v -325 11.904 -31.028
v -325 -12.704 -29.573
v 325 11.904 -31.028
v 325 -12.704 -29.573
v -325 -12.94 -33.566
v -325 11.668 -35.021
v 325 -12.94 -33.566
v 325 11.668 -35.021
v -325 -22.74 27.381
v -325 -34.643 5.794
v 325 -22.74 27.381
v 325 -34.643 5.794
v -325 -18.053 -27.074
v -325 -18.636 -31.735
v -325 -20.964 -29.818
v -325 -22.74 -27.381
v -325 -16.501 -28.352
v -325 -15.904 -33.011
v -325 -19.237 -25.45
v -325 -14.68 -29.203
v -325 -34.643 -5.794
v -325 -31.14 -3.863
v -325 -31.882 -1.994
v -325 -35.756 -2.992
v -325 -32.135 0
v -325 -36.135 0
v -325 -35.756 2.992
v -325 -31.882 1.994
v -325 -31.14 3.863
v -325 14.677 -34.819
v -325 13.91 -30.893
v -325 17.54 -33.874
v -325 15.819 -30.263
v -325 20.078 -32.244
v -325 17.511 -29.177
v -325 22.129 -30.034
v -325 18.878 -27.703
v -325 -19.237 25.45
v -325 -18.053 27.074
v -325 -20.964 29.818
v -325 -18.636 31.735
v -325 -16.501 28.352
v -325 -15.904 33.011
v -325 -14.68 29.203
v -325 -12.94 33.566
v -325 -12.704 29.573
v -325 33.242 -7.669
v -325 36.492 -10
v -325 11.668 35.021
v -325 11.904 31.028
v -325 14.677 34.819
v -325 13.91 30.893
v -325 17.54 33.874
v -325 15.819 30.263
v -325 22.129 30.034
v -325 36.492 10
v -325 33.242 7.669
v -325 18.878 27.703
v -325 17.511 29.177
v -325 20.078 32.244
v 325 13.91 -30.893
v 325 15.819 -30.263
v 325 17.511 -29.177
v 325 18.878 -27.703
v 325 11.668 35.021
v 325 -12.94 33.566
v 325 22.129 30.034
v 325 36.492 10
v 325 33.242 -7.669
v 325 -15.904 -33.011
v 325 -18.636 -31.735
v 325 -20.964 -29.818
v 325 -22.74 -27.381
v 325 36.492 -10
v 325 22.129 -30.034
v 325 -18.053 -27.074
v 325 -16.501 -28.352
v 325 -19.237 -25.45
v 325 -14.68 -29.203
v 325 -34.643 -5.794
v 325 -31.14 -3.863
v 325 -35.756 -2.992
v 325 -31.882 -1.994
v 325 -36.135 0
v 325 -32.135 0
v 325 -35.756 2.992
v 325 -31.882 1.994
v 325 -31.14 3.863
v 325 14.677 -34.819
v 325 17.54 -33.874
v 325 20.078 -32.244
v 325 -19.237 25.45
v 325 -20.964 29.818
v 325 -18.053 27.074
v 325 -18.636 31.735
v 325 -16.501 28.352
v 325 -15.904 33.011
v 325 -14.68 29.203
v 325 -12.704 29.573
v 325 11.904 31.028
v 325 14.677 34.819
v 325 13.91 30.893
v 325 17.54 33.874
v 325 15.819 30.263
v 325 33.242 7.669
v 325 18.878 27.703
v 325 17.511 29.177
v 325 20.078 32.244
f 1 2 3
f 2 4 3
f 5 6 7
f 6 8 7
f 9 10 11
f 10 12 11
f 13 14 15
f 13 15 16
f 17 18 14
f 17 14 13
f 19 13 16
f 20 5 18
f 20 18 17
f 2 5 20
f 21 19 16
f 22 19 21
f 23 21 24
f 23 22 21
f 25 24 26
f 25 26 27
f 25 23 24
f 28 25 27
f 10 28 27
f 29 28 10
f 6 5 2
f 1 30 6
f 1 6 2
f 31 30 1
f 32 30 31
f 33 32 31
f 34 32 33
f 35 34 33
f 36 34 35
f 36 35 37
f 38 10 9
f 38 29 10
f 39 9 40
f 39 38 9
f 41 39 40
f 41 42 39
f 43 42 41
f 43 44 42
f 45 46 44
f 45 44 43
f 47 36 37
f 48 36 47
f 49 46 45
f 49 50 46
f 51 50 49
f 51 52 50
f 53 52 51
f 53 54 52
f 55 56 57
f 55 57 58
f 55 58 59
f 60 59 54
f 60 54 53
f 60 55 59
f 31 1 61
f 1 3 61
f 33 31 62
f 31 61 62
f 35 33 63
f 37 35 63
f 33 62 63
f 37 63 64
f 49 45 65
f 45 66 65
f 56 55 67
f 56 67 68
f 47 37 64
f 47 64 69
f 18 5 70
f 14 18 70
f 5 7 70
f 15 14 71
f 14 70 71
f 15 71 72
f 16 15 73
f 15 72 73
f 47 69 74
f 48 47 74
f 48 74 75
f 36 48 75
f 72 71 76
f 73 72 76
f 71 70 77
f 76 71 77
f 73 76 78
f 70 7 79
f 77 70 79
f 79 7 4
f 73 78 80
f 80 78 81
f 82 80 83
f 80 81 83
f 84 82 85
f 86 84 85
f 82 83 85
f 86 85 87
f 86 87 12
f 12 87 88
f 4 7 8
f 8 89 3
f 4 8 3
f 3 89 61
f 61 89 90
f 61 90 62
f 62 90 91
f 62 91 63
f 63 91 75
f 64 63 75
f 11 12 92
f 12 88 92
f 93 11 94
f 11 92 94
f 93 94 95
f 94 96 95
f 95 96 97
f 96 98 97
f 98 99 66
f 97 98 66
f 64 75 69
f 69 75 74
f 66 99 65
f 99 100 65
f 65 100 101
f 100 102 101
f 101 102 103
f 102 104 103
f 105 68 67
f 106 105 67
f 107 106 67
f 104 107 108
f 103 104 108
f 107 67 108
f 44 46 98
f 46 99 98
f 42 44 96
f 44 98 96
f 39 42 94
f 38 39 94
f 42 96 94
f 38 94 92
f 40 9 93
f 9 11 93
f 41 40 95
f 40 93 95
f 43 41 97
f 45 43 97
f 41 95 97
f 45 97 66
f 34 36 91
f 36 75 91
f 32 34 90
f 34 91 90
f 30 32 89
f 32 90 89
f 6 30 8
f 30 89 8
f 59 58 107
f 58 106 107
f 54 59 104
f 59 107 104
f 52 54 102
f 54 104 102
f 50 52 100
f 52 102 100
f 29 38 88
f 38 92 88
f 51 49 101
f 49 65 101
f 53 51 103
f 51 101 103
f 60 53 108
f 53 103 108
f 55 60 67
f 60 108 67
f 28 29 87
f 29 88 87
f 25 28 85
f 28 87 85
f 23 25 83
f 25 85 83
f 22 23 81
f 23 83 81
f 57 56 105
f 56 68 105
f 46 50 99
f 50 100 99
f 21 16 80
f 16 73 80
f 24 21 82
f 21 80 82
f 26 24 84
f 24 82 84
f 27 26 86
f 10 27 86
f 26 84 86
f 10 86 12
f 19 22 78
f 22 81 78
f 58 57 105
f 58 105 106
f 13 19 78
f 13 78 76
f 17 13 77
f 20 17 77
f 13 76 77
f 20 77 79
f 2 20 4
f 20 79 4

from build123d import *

# Parameters (mm, degrees)
EXTRUDE_THIN1_DEPTH = 325


with BuildPart() as part:
    # Sketch1 → Extrude-Thin1 (new, symmetric)
    with BuildSketch(Plane(origin=(0, 0, 0), x_dir=(0, 0, -1), z_dir=(1, 0, 0))):
        with BuildLine():
            Line((10, 36.492499074), (30.033921668, 22.128857106))
            ThreePointArc((30.033921668, 22.128857106), (33.873815741, 17.540413964), (35.020847295, 11.668198405))
            Line((35.020847295, 11.668198405), (33.565953275, -12.939839131))
            ThreePointArc((33.565953275, -12.939839131), (31.734968696, -18.635986288), (27.381153255, -22.739995068))
            Line((27.381153255, -22.739995068), (5.79428183, -34.642902698))
            ThreePointArc((5.79428183, -34.642902698), (0, -36.134510905), (-5.79428183, -34.642902698))
            Line((-5.79428183, -34.642902698), (-27.381153255, -22.739995068))
            ThreePointArc((-27.381153255, -22.739995068), (-31.734968696, -18.635986288), (-33.565953275, -12.939839131))
            Line((-33.565953275, -12.939839131), (-35.020847295, 11.668198405))
            ThreePointArc((-35.020847295, 11.668198405), (-33.873815741, 17.540413964), (-30.033921668, 22.128857106))
            Line((-30.033921668, 22.128857106), (-10, 36.492499074))
            Line((-10, 36.492499074), (-7.669281259, 33.241691459))
            Line((-7.669281259, 33.241691459), (-27.703202927, 18.878049491))
            ThreePointArc((-27.703202927, 18.878049491), (-30.263132309, 15.819087397), (-31.027820011, 11.904277024))
            Line((-31.027820011, 11.904277024), (-29.572925992, -12.703760512))
            ThreePointArc((-29.572925992, -12.703760512), (-28.352269606, -16.50119195), (-25.449725978, -19.237197803))
            Line((-25.449725978, -19.237197803), (-3.862854553, -31.140105433))
            ThreePointArc((-3.862854553, -31.140105433), (0, -32.134510905), (3.862854553, -31.140105433))
            Line((3.862854553, -31.140105433), (25.449725978, -19.237197803))
            ThreePointArc((25.449725978, -19.237197803), (28.352269606, -16.50119195), (29.572925992, -12.703760512))
            Line((29.572925992, -12.703760512), (31.027820011, 11.904277024))
            ThreePointArc((31.027820011, 11.904277024), (30.263132309, 15.819087397), (27.703202927, 18.878049491))
            Line((27.703202927, 18.878049491), (7.669281259, 33.241691459))
            Line((7.669281259, 33.241691459), (10, 36.492499074))
        make_face()
    extrude(amount=EXTRUDE_THIN1_DEPTH, both=True)


solid = part.part
